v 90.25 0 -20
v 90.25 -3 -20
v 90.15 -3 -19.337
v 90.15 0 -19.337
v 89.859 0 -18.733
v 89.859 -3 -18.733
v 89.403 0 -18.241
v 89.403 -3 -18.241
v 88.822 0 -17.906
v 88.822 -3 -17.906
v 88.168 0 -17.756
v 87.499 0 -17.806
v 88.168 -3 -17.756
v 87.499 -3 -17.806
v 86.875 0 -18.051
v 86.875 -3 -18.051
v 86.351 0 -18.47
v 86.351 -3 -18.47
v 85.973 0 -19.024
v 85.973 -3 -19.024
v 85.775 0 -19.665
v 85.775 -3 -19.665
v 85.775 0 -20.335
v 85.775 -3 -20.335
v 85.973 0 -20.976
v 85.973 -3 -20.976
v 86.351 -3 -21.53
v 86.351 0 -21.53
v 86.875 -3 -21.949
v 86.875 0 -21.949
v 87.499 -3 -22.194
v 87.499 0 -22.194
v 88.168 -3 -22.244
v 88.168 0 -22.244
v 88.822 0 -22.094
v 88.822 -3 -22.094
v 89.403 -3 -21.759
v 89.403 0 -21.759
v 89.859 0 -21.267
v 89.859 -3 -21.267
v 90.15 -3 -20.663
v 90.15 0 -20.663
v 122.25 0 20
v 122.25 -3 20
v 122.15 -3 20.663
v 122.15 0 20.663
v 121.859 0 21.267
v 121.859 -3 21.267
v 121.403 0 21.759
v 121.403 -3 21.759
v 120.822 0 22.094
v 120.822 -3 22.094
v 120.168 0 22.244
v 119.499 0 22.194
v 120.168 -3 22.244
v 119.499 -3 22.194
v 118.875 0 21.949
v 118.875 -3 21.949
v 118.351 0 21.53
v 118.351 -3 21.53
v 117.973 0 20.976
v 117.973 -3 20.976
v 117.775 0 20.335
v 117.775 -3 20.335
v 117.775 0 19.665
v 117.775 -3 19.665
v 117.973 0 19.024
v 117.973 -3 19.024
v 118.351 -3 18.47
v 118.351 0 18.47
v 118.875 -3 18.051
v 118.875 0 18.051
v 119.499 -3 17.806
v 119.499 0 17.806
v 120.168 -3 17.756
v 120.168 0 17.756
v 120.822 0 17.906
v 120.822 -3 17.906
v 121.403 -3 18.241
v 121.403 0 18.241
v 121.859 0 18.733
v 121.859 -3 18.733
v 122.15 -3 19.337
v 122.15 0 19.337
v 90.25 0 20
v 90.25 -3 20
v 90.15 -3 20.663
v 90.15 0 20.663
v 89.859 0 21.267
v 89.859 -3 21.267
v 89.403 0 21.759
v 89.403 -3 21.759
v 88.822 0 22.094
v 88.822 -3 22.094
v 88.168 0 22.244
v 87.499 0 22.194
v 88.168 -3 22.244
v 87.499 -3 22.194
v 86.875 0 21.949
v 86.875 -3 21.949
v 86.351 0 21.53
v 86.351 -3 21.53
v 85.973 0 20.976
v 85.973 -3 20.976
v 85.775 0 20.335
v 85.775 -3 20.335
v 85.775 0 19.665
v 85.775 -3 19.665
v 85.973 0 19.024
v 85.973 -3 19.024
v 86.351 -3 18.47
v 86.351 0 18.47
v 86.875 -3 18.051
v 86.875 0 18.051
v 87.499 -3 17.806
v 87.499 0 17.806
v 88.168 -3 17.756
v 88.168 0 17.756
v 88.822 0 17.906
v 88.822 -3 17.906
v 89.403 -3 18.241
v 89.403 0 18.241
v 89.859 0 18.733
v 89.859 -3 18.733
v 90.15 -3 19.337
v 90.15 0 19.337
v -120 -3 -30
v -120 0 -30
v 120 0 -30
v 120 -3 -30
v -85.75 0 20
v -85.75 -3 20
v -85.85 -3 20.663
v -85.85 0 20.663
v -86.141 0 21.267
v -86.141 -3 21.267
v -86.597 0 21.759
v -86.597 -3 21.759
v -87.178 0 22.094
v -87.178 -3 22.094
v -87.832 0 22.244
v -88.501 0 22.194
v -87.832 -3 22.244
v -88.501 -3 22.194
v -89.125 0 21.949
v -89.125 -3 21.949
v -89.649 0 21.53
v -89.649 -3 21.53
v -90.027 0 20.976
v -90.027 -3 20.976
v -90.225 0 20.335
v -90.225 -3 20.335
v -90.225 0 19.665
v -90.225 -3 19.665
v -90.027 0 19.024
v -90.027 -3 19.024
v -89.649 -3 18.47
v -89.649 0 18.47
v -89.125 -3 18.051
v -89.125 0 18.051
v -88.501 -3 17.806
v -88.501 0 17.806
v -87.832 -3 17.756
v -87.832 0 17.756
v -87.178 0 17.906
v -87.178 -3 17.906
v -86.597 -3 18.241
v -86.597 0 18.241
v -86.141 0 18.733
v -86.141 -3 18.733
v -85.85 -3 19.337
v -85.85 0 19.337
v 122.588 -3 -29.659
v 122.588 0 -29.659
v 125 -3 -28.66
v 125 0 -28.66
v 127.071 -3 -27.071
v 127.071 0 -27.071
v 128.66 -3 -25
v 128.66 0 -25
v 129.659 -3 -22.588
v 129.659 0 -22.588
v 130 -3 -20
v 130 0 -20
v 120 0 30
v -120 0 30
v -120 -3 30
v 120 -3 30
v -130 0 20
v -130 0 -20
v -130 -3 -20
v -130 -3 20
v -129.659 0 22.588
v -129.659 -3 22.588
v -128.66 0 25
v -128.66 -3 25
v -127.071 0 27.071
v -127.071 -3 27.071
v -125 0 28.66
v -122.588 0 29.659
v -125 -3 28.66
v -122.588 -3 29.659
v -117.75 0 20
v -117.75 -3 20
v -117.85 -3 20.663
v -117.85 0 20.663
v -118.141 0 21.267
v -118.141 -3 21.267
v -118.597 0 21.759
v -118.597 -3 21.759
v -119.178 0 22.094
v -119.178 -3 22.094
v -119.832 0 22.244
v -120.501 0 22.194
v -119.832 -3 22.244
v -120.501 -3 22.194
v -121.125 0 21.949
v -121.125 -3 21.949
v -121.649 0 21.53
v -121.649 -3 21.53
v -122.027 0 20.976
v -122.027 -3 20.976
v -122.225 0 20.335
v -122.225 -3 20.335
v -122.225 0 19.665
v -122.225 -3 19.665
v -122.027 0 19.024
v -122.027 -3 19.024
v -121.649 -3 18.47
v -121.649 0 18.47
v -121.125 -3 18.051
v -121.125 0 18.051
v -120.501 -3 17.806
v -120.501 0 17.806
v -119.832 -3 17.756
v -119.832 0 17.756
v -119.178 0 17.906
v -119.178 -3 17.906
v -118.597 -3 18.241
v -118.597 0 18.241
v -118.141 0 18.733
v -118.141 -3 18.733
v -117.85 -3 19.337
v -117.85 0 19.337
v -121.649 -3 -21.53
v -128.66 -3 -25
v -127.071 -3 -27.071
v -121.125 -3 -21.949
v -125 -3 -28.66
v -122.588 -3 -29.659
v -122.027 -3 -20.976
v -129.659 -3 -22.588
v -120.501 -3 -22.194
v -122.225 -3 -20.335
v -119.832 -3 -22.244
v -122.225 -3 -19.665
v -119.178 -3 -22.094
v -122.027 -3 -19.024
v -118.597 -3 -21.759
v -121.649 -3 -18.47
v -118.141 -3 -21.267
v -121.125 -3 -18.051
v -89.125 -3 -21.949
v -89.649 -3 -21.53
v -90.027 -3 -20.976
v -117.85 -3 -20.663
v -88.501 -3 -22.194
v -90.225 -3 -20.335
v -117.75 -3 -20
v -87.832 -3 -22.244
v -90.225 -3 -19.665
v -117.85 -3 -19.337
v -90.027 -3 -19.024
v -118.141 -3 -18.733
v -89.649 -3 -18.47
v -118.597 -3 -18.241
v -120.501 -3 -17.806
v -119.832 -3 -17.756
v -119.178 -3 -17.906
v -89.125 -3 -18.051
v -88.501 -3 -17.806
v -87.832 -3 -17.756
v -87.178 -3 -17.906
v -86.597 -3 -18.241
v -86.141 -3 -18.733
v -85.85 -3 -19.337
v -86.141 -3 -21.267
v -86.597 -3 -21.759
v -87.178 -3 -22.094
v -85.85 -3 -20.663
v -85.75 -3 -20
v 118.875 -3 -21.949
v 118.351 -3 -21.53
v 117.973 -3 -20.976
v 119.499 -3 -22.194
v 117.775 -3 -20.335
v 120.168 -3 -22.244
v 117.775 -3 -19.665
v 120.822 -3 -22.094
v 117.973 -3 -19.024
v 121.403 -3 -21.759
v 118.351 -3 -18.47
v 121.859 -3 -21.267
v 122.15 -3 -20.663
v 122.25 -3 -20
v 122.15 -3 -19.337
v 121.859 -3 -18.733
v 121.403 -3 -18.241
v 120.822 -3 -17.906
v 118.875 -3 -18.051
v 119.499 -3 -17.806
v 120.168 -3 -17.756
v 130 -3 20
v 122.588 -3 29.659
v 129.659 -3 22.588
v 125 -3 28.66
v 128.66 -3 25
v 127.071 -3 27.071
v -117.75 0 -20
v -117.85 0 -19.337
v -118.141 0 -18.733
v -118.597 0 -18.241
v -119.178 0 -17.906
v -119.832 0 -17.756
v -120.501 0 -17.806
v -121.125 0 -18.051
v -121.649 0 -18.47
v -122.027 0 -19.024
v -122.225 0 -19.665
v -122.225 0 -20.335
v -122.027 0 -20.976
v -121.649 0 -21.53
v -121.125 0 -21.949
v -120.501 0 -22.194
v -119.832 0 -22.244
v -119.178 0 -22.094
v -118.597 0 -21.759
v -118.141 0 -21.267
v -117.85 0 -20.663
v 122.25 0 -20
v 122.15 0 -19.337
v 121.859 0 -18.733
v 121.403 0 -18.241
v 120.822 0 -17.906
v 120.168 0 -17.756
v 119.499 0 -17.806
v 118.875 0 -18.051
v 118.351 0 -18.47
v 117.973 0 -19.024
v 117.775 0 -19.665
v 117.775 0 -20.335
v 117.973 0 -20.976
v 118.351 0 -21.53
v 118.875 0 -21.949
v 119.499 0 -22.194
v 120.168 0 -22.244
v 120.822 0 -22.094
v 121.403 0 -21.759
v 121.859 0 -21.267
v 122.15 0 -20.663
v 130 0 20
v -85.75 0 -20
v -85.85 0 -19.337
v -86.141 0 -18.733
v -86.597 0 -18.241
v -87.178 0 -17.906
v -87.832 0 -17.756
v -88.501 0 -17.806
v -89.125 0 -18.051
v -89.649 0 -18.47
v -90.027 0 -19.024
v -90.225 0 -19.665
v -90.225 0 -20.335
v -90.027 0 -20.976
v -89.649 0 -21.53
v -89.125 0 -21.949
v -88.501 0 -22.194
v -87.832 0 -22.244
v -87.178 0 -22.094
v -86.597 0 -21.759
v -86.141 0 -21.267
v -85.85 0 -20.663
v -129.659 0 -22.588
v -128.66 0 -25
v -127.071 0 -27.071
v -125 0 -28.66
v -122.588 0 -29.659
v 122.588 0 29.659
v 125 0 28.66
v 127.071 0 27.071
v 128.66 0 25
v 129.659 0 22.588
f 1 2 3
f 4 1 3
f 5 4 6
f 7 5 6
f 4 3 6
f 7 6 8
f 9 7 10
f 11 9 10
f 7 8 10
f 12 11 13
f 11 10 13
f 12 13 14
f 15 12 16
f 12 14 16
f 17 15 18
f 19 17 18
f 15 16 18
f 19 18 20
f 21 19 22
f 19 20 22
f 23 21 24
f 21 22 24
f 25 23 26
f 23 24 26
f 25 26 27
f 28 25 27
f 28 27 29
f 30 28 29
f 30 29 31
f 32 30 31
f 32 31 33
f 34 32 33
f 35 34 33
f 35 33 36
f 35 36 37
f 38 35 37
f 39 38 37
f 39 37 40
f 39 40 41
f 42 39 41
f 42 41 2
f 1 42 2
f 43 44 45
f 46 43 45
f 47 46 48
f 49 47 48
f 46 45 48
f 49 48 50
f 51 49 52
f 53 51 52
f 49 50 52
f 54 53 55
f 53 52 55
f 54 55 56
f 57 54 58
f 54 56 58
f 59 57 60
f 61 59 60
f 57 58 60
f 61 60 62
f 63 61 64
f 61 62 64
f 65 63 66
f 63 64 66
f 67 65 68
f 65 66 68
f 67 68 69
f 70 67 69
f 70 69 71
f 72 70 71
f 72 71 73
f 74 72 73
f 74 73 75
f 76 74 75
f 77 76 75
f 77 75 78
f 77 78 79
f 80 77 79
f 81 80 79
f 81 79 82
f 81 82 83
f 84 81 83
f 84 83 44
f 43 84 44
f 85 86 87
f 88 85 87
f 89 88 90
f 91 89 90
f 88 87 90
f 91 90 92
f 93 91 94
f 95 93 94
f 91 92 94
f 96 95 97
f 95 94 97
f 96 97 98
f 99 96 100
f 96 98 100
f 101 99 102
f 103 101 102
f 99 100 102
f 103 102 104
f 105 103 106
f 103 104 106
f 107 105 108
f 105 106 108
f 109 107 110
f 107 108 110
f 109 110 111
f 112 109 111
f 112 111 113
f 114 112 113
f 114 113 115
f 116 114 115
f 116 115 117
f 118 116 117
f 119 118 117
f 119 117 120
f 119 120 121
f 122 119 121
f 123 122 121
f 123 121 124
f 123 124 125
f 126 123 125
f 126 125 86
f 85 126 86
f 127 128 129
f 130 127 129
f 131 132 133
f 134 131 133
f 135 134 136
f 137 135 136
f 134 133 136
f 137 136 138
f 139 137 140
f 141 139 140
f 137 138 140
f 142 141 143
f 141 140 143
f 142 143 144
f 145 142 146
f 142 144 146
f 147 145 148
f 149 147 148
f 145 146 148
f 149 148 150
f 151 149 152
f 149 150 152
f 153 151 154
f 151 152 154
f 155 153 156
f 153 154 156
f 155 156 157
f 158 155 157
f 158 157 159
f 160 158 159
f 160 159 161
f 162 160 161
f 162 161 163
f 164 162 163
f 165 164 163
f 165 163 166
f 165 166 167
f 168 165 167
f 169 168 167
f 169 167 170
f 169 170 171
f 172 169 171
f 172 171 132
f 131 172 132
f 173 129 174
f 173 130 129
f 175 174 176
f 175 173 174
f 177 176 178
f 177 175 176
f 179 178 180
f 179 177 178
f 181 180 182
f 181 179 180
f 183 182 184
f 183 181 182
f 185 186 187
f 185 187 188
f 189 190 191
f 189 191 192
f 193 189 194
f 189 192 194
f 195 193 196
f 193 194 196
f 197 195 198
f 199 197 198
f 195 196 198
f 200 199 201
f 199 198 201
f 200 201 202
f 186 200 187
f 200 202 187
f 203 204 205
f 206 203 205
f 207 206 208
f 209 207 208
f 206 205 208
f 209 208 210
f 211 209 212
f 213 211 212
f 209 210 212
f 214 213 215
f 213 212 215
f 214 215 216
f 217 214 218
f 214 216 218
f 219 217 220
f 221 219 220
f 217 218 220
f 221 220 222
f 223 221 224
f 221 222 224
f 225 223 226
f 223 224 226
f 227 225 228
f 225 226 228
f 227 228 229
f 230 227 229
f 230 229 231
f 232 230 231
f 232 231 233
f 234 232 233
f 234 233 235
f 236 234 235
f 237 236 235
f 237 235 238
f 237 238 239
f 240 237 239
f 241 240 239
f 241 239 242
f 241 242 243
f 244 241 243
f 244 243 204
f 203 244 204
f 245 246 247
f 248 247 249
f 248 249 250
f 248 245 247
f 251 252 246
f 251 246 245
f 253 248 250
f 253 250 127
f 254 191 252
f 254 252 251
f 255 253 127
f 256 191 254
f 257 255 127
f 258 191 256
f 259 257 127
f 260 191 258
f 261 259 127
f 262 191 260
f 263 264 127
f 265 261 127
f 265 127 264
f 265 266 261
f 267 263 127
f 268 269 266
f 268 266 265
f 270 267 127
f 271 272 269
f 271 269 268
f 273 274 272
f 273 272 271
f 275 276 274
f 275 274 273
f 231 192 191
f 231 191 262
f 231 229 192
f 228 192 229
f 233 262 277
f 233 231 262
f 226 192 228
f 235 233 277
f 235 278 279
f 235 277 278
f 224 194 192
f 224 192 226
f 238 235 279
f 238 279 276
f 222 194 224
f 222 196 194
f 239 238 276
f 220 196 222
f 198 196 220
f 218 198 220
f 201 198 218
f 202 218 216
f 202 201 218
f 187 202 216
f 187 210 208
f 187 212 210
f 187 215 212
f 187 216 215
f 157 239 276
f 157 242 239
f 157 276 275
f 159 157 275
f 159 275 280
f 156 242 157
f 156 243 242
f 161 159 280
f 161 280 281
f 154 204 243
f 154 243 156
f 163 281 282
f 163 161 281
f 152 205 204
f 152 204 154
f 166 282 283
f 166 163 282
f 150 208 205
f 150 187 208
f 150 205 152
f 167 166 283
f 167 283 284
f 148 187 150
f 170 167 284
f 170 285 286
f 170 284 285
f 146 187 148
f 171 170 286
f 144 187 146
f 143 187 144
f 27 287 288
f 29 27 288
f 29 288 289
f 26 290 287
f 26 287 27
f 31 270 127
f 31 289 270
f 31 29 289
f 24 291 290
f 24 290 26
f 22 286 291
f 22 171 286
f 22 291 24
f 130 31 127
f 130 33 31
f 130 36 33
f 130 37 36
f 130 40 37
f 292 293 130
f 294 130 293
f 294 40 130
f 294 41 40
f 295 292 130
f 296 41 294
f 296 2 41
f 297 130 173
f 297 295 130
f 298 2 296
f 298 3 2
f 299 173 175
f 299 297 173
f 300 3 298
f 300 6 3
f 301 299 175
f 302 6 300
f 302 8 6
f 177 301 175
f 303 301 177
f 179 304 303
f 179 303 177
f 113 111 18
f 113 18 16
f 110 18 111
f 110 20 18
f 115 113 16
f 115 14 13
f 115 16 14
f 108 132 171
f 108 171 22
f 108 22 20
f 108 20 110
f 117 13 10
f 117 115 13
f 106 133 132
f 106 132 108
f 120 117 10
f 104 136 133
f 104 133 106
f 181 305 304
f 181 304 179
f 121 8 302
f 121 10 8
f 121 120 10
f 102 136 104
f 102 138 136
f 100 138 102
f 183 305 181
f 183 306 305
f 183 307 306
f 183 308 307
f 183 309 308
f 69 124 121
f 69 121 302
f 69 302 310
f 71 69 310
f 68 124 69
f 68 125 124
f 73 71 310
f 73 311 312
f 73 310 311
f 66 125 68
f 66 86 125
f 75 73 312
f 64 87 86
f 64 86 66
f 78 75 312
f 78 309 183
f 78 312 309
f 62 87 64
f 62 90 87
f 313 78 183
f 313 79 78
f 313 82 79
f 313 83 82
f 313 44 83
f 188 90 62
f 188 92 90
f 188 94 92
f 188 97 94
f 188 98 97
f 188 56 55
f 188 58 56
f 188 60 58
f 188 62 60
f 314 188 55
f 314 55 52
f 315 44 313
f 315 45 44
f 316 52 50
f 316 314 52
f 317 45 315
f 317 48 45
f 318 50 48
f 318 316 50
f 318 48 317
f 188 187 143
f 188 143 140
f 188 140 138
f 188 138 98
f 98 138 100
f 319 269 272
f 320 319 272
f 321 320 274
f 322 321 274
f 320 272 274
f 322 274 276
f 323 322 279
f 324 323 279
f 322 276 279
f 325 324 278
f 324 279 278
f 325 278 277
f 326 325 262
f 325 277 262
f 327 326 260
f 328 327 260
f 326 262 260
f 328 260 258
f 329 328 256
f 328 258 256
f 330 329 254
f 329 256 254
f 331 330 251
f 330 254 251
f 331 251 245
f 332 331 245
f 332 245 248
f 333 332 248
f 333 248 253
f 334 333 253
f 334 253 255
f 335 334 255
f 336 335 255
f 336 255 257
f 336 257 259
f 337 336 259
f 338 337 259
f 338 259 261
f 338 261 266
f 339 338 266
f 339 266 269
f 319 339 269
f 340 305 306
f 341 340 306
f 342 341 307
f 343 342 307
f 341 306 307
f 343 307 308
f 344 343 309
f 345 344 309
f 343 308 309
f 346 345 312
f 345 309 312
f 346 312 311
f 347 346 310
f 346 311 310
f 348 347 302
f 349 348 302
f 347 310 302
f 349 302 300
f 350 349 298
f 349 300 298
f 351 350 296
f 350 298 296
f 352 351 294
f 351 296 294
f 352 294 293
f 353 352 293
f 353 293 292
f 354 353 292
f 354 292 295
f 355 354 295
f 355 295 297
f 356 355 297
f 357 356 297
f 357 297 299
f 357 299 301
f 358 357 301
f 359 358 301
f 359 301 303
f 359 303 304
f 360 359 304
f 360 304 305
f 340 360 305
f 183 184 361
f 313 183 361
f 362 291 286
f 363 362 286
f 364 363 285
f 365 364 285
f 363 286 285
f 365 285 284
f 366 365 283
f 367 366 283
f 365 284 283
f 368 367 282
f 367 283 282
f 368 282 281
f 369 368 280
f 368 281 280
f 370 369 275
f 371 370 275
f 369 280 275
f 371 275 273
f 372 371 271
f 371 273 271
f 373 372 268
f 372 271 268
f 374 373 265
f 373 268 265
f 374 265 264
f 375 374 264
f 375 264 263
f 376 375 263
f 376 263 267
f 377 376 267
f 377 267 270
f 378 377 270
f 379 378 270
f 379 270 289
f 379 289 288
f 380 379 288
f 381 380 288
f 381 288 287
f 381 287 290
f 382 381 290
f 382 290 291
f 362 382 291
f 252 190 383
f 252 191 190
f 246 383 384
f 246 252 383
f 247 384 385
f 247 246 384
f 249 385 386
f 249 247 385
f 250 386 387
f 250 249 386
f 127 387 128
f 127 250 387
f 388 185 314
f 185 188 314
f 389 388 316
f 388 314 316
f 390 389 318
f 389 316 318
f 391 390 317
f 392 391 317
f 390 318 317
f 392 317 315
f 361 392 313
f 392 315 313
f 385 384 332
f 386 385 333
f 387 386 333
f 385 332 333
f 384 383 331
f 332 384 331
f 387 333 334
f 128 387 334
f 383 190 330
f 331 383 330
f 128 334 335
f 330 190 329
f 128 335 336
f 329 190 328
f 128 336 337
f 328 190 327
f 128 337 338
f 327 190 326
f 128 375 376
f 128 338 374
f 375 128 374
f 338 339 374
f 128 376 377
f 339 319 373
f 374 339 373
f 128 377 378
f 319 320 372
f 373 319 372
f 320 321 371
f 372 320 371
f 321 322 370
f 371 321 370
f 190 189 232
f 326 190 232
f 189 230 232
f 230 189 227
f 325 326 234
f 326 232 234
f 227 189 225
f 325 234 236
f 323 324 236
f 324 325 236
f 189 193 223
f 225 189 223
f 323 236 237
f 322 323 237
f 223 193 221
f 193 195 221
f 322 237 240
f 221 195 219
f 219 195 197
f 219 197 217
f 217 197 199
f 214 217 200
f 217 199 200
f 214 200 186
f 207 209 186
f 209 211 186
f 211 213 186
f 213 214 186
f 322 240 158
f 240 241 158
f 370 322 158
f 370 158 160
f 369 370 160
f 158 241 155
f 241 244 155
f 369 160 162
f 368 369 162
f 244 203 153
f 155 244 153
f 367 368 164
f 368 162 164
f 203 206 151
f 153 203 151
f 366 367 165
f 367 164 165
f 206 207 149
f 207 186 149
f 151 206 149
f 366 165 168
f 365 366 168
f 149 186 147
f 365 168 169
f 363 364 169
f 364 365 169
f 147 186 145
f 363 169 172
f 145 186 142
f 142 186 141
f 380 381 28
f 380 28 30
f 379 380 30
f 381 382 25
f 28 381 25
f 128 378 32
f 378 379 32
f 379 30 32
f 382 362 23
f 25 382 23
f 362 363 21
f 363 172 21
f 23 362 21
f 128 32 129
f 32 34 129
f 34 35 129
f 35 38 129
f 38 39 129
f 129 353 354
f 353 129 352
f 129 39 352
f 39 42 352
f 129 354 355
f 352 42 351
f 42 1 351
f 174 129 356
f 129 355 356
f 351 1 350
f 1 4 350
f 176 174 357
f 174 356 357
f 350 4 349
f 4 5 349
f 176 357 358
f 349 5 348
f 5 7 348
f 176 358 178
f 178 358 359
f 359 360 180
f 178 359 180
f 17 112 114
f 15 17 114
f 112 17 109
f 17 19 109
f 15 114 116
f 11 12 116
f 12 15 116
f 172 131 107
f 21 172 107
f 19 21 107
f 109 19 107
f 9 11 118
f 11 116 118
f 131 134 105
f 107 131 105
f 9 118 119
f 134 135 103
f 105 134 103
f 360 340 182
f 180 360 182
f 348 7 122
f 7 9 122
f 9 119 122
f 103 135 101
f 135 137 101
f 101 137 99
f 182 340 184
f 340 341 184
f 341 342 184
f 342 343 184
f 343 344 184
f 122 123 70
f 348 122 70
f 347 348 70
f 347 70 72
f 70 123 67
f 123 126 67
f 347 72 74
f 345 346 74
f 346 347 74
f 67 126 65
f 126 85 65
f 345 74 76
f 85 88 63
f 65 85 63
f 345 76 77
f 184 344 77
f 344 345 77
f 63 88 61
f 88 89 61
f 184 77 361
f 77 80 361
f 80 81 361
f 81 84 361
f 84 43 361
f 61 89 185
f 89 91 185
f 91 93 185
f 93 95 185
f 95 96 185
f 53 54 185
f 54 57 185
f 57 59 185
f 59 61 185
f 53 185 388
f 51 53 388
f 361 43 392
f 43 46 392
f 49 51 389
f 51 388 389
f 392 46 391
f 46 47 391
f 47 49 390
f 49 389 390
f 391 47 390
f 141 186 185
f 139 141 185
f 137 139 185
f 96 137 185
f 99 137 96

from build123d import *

# Parameters (mm, degrees)
F0_W     = 260
F0_H     = 60
F1_DEPTH = 3
F2_R     = 2.25
F3_DEPTH = 3.001
F4_R     = 10


with BuildPart() as f1:
    # F0 (on Front) → F1 (new body)
    with BuildSketch(Plane.XZ):
        Rectangle(F0_W, F0_H)
    extrude(amount=F1_DEPTH)

    # F2 (on face) → F3 (cut, through all)
    with BuildSketch(Plane.XZ.offset(3)):
        with Locations((-120, 20)):
            Circle(F2_R)
        with Locations((-120, -20)):
            Circle(F2_R)
        with Locations((-88, 20)):
            Circle(F2_R)
        with Locations((-88, -20)):
            Circle(F2_R)
        with Locations((88, 20)):
            Circle(F2_R)
        with Locations((120, 20)):
            Circle(F2_R)
        with Locations((120, -20)):
            Circle(F2_R)
        with Locations((88, -20)):
            Circle(F2_R)
    extrude(amount=-F3_DEPTH, mode=Mode.SUBTRACT)

    # F4
    f4_edges = [f1.edges().sort_by_distance(p)[0] for p in [
        (-130, -1.5, 30),
        (-130, -1.5, -30),
        (130, -1.5, -30),
        (130, -1.5, 30),
    ]]
    fillet(f4_edges, radius=F4_R)


solid = f1.part
